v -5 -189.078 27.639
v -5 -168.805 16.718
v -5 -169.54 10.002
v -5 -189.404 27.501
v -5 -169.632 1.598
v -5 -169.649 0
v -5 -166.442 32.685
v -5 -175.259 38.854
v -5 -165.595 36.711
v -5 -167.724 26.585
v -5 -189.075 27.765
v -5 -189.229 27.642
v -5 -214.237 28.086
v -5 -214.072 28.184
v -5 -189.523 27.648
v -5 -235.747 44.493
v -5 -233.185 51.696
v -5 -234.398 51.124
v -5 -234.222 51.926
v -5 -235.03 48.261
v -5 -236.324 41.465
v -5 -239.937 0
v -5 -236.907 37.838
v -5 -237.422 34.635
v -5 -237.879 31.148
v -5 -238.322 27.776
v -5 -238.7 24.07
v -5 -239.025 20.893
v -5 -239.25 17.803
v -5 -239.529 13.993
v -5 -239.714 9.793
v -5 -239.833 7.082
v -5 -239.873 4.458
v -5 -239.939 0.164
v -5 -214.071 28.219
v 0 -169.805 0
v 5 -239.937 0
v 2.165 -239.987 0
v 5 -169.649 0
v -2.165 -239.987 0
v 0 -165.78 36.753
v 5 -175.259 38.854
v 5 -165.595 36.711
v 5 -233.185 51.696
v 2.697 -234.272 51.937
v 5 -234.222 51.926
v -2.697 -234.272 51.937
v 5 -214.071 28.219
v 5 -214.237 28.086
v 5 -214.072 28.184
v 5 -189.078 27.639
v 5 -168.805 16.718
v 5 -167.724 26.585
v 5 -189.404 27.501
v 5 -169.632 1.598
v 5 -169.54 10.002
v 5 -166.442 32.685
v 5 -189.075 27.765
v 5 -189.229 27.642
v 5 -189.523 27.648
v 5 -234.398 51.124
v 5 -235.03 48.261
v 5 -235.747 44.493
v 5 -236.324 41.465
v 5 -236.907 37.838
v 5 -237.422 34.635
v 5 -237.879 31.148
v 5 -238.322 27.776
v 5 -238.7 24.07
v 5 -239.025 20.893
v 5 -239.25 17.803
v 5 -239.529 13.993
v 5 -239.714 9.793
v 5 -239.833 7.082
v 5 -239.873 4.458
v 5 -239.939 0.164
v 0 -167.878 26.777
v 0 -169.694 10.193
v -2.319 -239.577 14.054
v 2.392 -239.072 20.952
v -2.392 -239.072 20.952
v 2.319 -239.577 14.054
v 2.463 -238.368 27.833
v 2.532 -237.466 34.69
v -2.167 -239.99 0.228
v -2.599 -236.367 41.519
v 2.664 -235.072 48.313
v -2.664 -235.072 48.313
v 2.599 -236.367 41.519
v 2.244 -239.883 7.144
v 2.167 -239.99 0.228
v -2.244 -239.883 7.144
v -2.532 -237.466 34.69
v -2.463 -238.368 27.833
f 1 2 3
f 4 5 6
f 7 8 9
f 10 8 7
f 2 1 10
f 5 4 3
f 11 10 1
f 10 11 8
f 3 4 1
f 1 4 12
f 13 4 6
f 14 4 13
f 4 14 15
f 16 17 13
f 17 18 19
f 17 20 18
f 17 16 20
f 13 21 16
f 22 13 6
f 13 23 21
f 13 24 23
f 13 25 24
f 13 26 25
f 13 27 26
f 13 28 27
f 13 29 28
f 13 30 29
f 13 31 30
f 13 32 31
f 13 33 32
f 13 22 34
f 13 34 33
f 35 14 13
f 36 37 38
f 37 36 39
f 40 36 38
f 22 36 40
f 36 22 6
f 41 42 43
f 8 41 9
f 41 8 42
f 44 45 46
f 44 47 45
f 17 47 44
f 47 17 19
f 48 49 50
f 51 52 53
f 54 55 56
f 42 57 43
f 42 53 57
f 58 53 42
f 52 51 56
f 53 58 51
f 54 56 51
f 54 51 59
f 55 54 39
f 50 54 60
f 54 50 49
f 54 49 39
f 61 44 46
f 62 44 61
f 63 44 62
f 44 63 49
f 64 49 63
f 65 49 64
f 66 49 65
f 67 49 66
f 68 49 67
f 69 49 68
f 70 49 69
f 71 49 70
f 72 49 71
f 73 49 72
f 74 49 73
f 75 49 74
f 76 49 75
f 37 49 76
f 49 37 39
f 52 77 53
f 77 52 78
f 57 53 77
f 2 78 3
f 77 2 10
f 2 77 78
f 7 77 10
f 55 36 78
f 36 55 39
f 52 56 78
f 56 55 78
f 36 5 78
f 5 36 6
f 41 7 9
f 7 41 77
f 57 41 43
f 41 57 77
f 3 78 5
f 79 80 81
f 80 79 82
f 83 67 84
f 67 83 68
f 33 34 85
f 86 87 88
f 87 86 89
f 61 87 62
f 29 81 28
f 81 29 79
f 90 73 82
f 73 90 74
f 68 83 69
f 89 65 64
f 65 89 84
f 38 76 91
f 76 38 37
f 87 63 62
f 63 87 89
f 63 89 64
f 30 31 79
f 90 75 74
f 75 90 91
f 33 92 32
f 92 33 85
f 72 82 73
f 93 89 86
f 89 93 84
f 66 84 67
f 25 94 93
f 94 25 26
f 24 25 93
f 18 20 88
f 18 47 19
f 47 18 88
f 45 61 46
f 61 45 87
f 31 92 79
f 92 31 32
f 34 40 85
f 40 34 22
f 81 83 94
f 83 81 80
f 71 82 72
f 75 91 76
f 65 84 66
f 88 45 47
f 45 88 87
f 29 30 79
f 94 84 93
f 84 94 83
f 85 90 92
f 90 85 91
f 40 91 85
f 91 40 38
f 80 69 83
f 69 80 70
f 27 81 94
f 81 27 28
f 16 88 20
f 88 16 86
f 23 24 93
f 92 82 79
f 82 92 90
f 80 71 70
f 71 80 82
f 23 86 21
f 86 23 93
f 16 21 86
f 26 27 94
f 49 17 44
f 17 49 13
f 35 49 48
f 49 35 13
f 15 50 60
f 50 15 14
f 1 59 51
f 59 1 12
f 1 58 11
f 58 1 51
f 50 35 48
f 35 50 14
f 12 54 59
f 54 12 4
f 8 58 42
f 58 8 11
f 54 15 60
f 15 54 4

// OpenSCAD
// file: ../motors/MN5212.scad
use <../utils.scad>

module MN5212(){

	//render(){
		difference(){
			union(){
				translate([0,0, 42.5 / 2 - 23 / 2 - 4.9 - 6])
					cylinder(
						h = 23,
						r = 59 / 2,
						$fa = fa(59 / 2),
						center = true);
				translate([0,0, 42.5 / 2 - 4.9 / 2 - 6])
					cylinder(
						h = 4.9,
						r1 = 59 / 2,
						r2 = 24.8 / 2,
						$fa = fa(59 / 2),
						center = true);
				translate([0,0, - 42.5 / 2 + 5.6 / 2 + 3])
					cylinder(
						h = 5.6,
						r1 = 44 / 2,
						r2 = 59 / 2,
						$fa = fa(59 / 2),
						center = true);
				translate([0, 0, 42.5 / 2 - 3])
					cylinder(
						h = 6,
						r = 4 / 2,
						$fa = fa(4 / 2),
						center = true);
				translate([0, 0, - 42.5 / 2 + 1.5])
					cylinder(
						h = 3,
						r = 6 / 2,
						$fa = fa(6 / 2),
						center = true);
			}
			union(){
				for(i = [0:90:270])
					rotate([0, 0, i])
						translate([0, 25 / 2, -16.25 - 0.025])
							cylinder(
								h = 4,
								r = 3 / 2,
								$fa = fa(3 / 2),
								center = true);
				for(i = [0:120:240])
					rotate([0, 0, i])
						translate([0, 17 / 2, 12.75 + 0.025])
							cylinder(
								h = 5,
								r = 3 / 2,
								$fa = fa(3 / 2),
								center = true);
				rotate([0, 0, 30])
					translate([0, 12 / 2, 12.75 + 0.025])
						cylinder(
							h = 5,
							r = 3 / 2,
							$fa = fa(3 / 2),
							center = true);
				rotate([0, 0, 30 + 180])
					translate([0, 12 / 2, 12.75 + 0.025])
						cylinder(
							h = 5,
							r = 3 / 2,
							$fa = fa(3 / 2),
							center = true);
			}
		}

	//}

}

MN5212();
// file: ../servos/TGY_4805_2PA.scad
use <../utils.scad>

module TGY_4805_2PA(){

	length = 40;
	width = 20;
	depth = 36.4;
	wing_width = 58;
	wing_thick = 2.45;
	wing_height = 27.7;
	shaft_offset = 9.5;
	hole_seperation = 9.2;
	hole_spacing = 50;
	shaft_height = 40;
	shaft_length = 3.6;
	hole_diameter = 4.8;

	module mounting_hole(){
		mh_rad = hole_diameter / 2;
		translate(
			[
				hole_spacing / 2,
				0,
				-depth / 2 + wing_height - wing_thick / 2
			])
			cylinder(h = 5, r = mh_rad, $fa = fa(mh_rad), center = true);
	}

	difference(){
		union(){
			cube([length, width, depth], center = true);
			translate([0, 0, -depth / 2 + wing_height - wing_thick / 2])
				cube([wing_width, width, wing_thick], center = true);
			translate(
				[
					- length / 2 + shaft_offset,
					0,
					shaft_height - length / 2 + shaft_length / 2
				])
				cylinder(
					h = shaft_length,
					r = 1.5,
					$fa = fa(1.5),
					center = true);
		}	union(){

			translate([0, hole_seperation / 2, 0]){
				mounting_hole();
				mirror() mounting_hole();
			}
			translate([0, -hole_seperation / 2, 0]){
				mounting_hole();
				mirror() mounting_hole();
			}
		}
	}
}

module TGY_4805_2PA_translate(){
	length = 40;
	shaft_offset = 9.5;
	shaft_height = 40;
	shaft_length = 3.6;
	translate(
		[
				- length / 2 + shaft_offset,
				0,
				shaft_height - length / 2 + shaft_length / 2
		]) children();
}

TGY_4805_2PA();
// file: ../servos/HS_5065MG.scad
use <../utils.scad>

module HS_5065MG(){

	length = 23.75;
	width = 11.68;
	depth = 20.32;
	wing_width = 32.38;
	wing_thick = 2;
	wing_offset = 1;
	shaft_offset = 6;
	hole_spacing = 28.32;
	hole_spacing_2 = 27;
	hole_2_wide = 6;
	hole_diameter = 2;
	shaft_height = 26.16;
	shaft_length = 2;

	module mounting_hole(){
		mh_rad = hole_diameter / 2;
		translate(
			[
				hole_spacing / 2,
				0,
				depth / 2 - wing_thick / 2
			])
			cylinder(h = 5, r = mh_rad, $fa = fa(mh_rad), center = true);
		translate(
			[
				hole_spacing_2 / 2,
				hole_2_wide / 2,
				depth / 2 - wing_thick / 2
			])
			cylinder(h = 5, r = mh_rad, $fa = fa(mh_rad), center = true);
		translate(
			[
				hole_spacing_2 / 2,
				- hole_2_wide / 2,
				depth / 2 - wing_thick / 2
			])
			cylinder(h = 5, r = mh_rad, $fa = fa(mh_rad), center = true);
	}

	difference(){
		union(){
			cube([length, width, depth], center = true);
			translate([0, 0, depth / 2 - wing_thick / 2 - wing_offset])
				cube([wing_width, width, wing_thick], center = true);
			translate(
				[
					- length / 2 + shaft_offset,
					0,
					depth / 2 + 3.8 + 1.9 + shaft_length / 2
				])
				cylinder(
					h = shaft_length,
					r = 1.5,
					$fa = fa(1.5),
					center = true);
			translate(
				[
					- length / 2 + shaft_offset,
					0,
					depth / 2 + 3.8 / 2
				])
				cylinder(
					h = 3.8,
					r = 11.3 / 2,
					$fa = fa(11.3 / 2),
					center = true);
			translate(
				[
					- length / 2 + shaft_offset,
					0,
					depth / 2 + 3.8 + 1.9 / 2
				])
				cylinder(
					h = 1.9,
					r1 = 11.3 / 2,
					r2 = 8 / 2,
					$fa = fa(11.3 / 2),
					center = true);
		}	union(){

			mounting_hole();
			mirror() mounting_hole();
		}
	}
}

module HS_5065MG_arm(){

	hole_size = 1.5;
	hole_spacing = 3;
	hole_offset = 9.6;

	difference(){
		union(){
			translate([0, 0, 4.4 / 2])
				cylinder(
					h = 4.4,
					r = 8 / 2,
					$fa = fa(8 / 2),
					center = true);
			hull(){
				translate([0, 0, 4.4 - 1.8 / 2])
					cylinder(
						h = 1.8,
						r = 8 / 2,
						$fa = fa(8 / 2),
						center = true);
				translate([18.8, 0, 4.4 - 1.8 / 2])
					cylinder(
						h = 1.8,
						r = 5 / 2,
						$fa = fa(5 / 2),
						center = true);
			}
		}
		union(){
			for(i = [0:3]){
				translate([hole_offset + hole_spacing * i, 0, 4.4 - 1.8 / 2])
					cylinder(
						h = 5,
						r = hole_size / 2,
						$fa = fa(hole_size / 2),
						center = true);
			}
		}
	}
}

module HS_5065MG_shaft_translate(){
	translate(
		[
			- 23.75 / 2 + 6,
			0,
			20.32 / 2 + 3.8 + 1.9
		])
			children();
}

HS_5065MG();
HS_5065MG_shaft_translate() HS_5065MG_arm();
// file: ../servos/LS_0006_servo.scad
// Author Michael Marques (DrYerzinia)

use <../utils.scad>

module ls_0006_servo(){
	
	length = 21.4;
	depth = 19.9;
	thickness = 11.65;

	gear_height = 2.6;
	gear_bump_height = 0.7;
	gear_bump_diameter = 1.97;
	gear_outer_bump_diameter = 6;
	gear_bump_offset = 12.2;

	shaft_height = 2.4;
	shaft_diameter = 3.74;
	shaft_offset = thickness / 2;
	shaft_screw_diameter = 1.3;
	
	wing_outer_width = 8.5;
	wing_top_off = 3.8;
	wing_length = 3.8;
	wing_thickness = 1.2;
	wing_hole_diameter = 1.85;
	wing_hole_edge_dist = 2;

	module wing_hole(){
		translate(
			[
				length / 2 + wing_hole_edge_dist,
				0,
				depth/2 - wing_top_off - wing_thickness / 2
			])
			cylinder(
				h = wing_thickness + 1,
				r = wing_hole_diameter / 2,
				$fn = 16,
				center = true);
	}

	module wing(){
		translate(
			[
				length / 2,
				thickness / 2,
				depth/2 - wing_top_off - wing_thickness
			])
			rotate([0,0,-90])
				trapezoid(
					thickness,
					wing_outer_width,
					wing_length,
					wing_thickness);
	}

	// Body
	cube([length, thickness, depth], center = true);

	difference(){
		union(){

			wing();
			mirror() wing();

			// Gear Bumps
			translate([0, 0, depth/2 + gear_height / 2]){
				translate([length / 2 - gear_bump_offset, 0, 0])
					cylinder(
						h = gear_height,
						r = gear_outer_bump_diameter / 2,
						$fn = 16,
						center = true);
				translate([length / 2 - gear_bump_offset, 0, gear_height/2 + gear_bump_height / 2])
					cylinder(
						h = gear_bump_height,
						r = gear_bump_diameter / 2,
						$fn = 16,
						center = true);
				translate([length / 2 - shaft_offset, 0, 0])
					cylinder(
						h = gear_height,
						r = thickness / 2,
						$fn = 32,
						center = true);
				// Shaft
				translate([length / 2 - shaft_offset, 0, gear_height])
					cylinder(
						h = shaft_height,
						r = shaft_diameter / 2,
						$fn = 16,
						center = true);
			}

		}
		union(){

			wing_hole();
			mirror() wing_hole();

			// Shaft_hole
			translate(
				[
					length / 2 - shaft_offset,
					0,
					depth/2 + gear_height * (3 / 2) + 0.5])
				cylinder(
					h = shaft_height + 1,
					r = shaft_screw_diameter / 2,
					$fn = 16,
					center = true);

		}
	}

}

module translate_ls_0006_attachment(){

	length = 21.4;
	thickness = 11.65;
	shaft_offset = thickness / 2;
	depth = 19.9;
	float = 3.3;

	translate([length / 2 - shaft_offset, 0, depth / 2 + float])
		children();

}

module bar_attachment(){

	height = 3.75;
	bar_length = 14.7;
	bar_thickness = 1.6;
	inner_radius = 5.9;
	outer_radius = 3.95;
	shaft_diameter = 3.7;
	upper_void_diameter = 4.8;
	screw_diameter = 2;
	hole_spacing = 2;
	hole_4_diameter = 1.2;
	hole_diameter = 1;
	hole_start_off = 4.7;
	top_void_depth = 0.67;
	bottom_void_depth = 1.84;

	translate([0, 0, height / 2]){
		difference(){
			union(){

				translate([0, inner_radius / 2, height / 2 - bar_thickness])
					rotate([0,0,-90])
						trapezoid(
							inner_radius,
							outer_radius,
							bar_length,
							bar_thickness);

				cylinder(
					h = height,
					r = inner_radius / 2,
					$fn = 16,
					center = true);

				translate([bar_length, 0, height / 2 - bar_thickness / 2])
					cylinder(
						h = bar_thickness,
						r = outer_radius / 2,
						$fn = 16,
						center = true);

			}
			union(){
				// screwhole
				cylinder(
					h = height + 1,
					r = screw_diameter / 2,
					$fn = 16,
					center = true);
				// voids
				translate([0, 0, height / 2 - top_void_depth / 2 + 0.5])
					cylinder(
						h = top_void_depth + 1,
						r = upper_void_diameter / 2,
						$fn = 16,
						center = true);
				translate([0, 0,  - bottom_void_depth / 2 - 0.5])
					cylinder(
						h = bottom_void_depth + 1,
						r = shaft_diameter / 2,
						$fn = 16,
						center = true);

				for(i = [0:4]){
					dia = (i != 3) ? hole_diameter : hole_4_diameter;
					translate(
						[
							hole_start_off + hole_spacing * i,
							0,
							height / 2 - bar_thickness / 2])
						cylinder(
							h = bar_thickness + 1,
							r = dia / 2,
							$fn = 16,
							center = true);
				}

			}
		}
	}

}

ls_0006_servo();
translate_ls_0006_attachment() bar_attachment();
// file: ../servos/parallax_continuous_rotation_servo.scad
// Author Michael Marques (DrYerzinia)

module parallax_continuous_rotation_servo(){

	depth = 37.7;
	length = 40.75;
	width = 19.75;

	mount_height = 2.7;
	mount_extent = 6.1;
	mount_from_top = 7.7;

	mount_hole_diameter = 4.46;
	mount_hole_spacing = 14.4 - mount_hole_diameter;

	shaft_diameter = 5.8;
	shaft_offset = 10;
	shaft_length = 3.5;

	module mounting_hole(){

			translate(
				[
					length / 2 + 5,
					mount_hole_spacing / 2,
					depth / 2 - mount_height / 2 - mount_from_top
				]
				)
				cylinder(
					h = mount_height + 1,
					r = mount_hole_diameter / 2,
					$fn=16,
					center = true);
	}

	difference(){
		union(){

			// Body
			cube([length,width,depth], center = true);

			// Mounting wings
			translate(
				[
					0,
					0,
					depth / 2 - mount_height / 2 - mount_from_top
				])
				cube(
					[
						length + mount_extent * 2,
						width,
						mount_height
					],
					center = true);

			// Shaft
			translate(
				[
					length / 2 - shaft_offset,
					0,
					depth / 2 + shaft_length / 2
				]
				)
				cylinder(
					h = shaft_length,
					r = shaft_diameter / 2,
					$fn = 16,
					center = true
				);

		}
		union(){

			// Mounting Holes
			mounting_hole();
			mirror()
				mounting_hole();

			translate([0,-mount_hole_spacing,0]){
				mounting_hole();
				mirror()
					mounting_hole();
			}
		}
	}

}

module translate_shaft(){

	depth = 37.7;
	length = 40.75;

	shaft_offset = 10;

	translate(
		[
			length / 2 - shaft_offset,
			0,
			depth / 2
		])
		children();
}

module round_servo_attachment(){

	height = 6;
	diameter = 20.8;
	inner_diameter = 8.6;
	plate_thickness = 2.45;

	float = 2;

	depth = 37.7;
	length = 40.75;

	shaft_offset = 10;

	plate_hole_spacing = 14.5;
	plate_hole_diameter = 1.4;
	plate_hole_minor_spacing = 3.5;

	screw_hole_diameter = 3;

	inner_diameter = 8;
	
	top_depth = 1.8;
	bottom_depth = 3.4;

	void_diameter = 5.8;

	module plate_hole(){
		cylinder(
			h = plate_thickness + 1,
			r = plate_hole_diameter / 2,
			$fn = 16,
			center = true
		);
	}

	module plate_hole_group(){
		translate([0, 0, height / 2 - plate_thickness / 2]){
			translate([0, plate_hole_spacing / 2, 0]){
					plate_hole();
					translate([- plate_hole_minor_spacing, 0, 0])
						plate_hole();
					translate([  plate_hole_minor_spacing, 0, 0])
						plate_hole();
			}
		}
	}

	translate(
		[
			length / 2 - shaft_offset,
			0,
			depth / 2 + height / 2 + float
		]
		)
		difference(){

			union(){

				// inner shaft
				cylinder(
					h = height,
					r = inner_diameter / 2,
					$fn = 16,
					center = true
				);

				// top
				translate([0, 0, height / 2 - plate_thickness / 2])
					cylinder(
						h = plate_thickness,
						r = diameter / 2,
						$fn = 32,
						center = true
					);
			}

			union(){

				// plate holes
				for(ang = [0:3]){
					rotate([0,0, ang * 90])
						plate_hole_group();
				}

				// screw hole
				cylinder(
					h = height + 1,
					r = screw_hole_diameter / 2,
					$fn = 16,
					center = true
				);

				// inner voids
				translate([0, 0, height / 2 - top_depth / 2 + 1])
					cylinder(
						h = top_depth + 1,
						r = void_diameter / 2,
						$fn = 16,
						center = true
					);
				translate([0, 0, -1])
					cylinder(
						h = bottom_depth + 1,
						r = void_diameter / 2,
						$fn = 16,
						center = true
					);

			}

		}

}

parallax_continuous_rotation_servo();
round_servo_attachment();
// file: ../hardware.scad
 // Author Michael Marques (DrYerzinia)

// http://www.ebay.com/itm/10-PCS-683-3x7x2-mm-Metal-OPEN-PRECISION-Miniature-Ball-Bearing-3-7-2-/291206307942?hash=item43cd3fa066:m:mCi6eovrGVk_CjIUjlhw8yg
// E-Bay empire.rc

module washer_M3_7x3_2x0_5mm(){

	difference(){
		cylinder(
			h = 0.5,
			r = 7 / 2,
			$fn = 16,
			center = true);
		cylinder(
			h = 0.5 + 0.1,
			r = 3.2 / 2,
			$fn = 16,
			center = true);
	}

}

module bearing_3x7x2mm(){

	difference(){
		cylinder(
			h = 2,
			r = 7 / 2,
			$fn = 16,
			center = true);
		cylinder(
			h = 2 + 1,
			r = 3 / 2,
			$fn = 16,
			center = true);
	}

}

module bearing_5x8x2_5mm(){

	difference(){
		cylinder(
			h = 2.5,
			r = 8 / 2,
			$fn = 16,
			center = true);
		cylinder(
			h = 2.5 + 1,
			r = 5 / 2,
			$fn = 16,
			center = true);
	}

}

module bearing_8x16x5mm(){

	difference(){
		cylinder(
			h = 5,
			r = 16 / 2,
			$fn = 16,
			center = true);
		cylinder(
			h = 5 + 1,
			r = 8 / 2,
			$fn = 16,
			center = true);
	}

}


bearing_5x8x2_5mm();
// file: ../utils.scad
// http://forum.openscad.org/Creating-pie-pizza-slice-shape-need-a-dynamic-length-array-td3148.html

module pie_slice(r, start_angle, end_angle) {
    R = r * sqrt(2) + 1;
    a0 = (4 * start_angle + 0 * end_angle) / 4;
    a1 = (3 * start_angle + 1 * end_angle) / 4;
    a2 = (2 * start_angle + 2 * end_angle) / 4;
    a3 = (1 * start_angle + 3 * end_angle) / 4;
    a4 = (0 * start_angle + 4 * end_angle) / 4;
    if(end_angle > start_angle)
        intersection() {
        circle(r, $fa = fa(r));
        polygon([
            [0,0],
            [R * cos(a0), R * sin(a0)],
            [R * cos(a1), R * sin(a1)],
            [R * cos(a2), R * sin(a2)],
            [R * cos(a3), R * sin(a3)],
            [R * cos(a4), R * sin(a4)],
            [0,0]
       ]);
    }
}

// https://github.com/openscad/openscad/issues/29

module rotate_about(v,a) {
	translate(v) rotate(a) translate(-v) children();
}

module rotate_about_axis(v, ang, axis) {
	translate(v) rotate(ang, axis) translate(-v) children();
}

// https://github.com/robofun/openscad-utils/blob/master/trapezoid.scad

module trapezoid(width_base, width_top, height, thickness){

  linear_extrude(height = thickness)
			polygon(
				points =
					[
						[0,0],
						[width_base,0],
						[width_base-(width_base-width_top)/2,height],
						[(width_base-width_top)/2,height]
					],
					paths=[[0,1,2,3]]); 
  
}

// http://forum.openscad.org/fe-Tolerance-based-arc-approximation-td14212.html

function fa(r)=($fn>0)?360/$fn:($fe>0)?($fe<r)?min(45,2*acos(1-$fe/r)):45:$fa; 
// file: ../render_settings.scad
// Author Michael Marques (DrYerzinia)

// Lulzbot Mini tolerances
// x/y 0.1mm
// z   0.05mm
//
// 0.1mm   preview tolerance
// 0.025mm export  tolerance

$fs = 0.01;
$fn = undef;
$fa = 360 / 5;

$fe = 0.025;	// export
// main file
// Author Michael Marques (DrYerzinia)

include <../render_settings.scad>

use <../BB8.scad>

rotate([38.75 + 90, 0, 0])
Body_P20();
